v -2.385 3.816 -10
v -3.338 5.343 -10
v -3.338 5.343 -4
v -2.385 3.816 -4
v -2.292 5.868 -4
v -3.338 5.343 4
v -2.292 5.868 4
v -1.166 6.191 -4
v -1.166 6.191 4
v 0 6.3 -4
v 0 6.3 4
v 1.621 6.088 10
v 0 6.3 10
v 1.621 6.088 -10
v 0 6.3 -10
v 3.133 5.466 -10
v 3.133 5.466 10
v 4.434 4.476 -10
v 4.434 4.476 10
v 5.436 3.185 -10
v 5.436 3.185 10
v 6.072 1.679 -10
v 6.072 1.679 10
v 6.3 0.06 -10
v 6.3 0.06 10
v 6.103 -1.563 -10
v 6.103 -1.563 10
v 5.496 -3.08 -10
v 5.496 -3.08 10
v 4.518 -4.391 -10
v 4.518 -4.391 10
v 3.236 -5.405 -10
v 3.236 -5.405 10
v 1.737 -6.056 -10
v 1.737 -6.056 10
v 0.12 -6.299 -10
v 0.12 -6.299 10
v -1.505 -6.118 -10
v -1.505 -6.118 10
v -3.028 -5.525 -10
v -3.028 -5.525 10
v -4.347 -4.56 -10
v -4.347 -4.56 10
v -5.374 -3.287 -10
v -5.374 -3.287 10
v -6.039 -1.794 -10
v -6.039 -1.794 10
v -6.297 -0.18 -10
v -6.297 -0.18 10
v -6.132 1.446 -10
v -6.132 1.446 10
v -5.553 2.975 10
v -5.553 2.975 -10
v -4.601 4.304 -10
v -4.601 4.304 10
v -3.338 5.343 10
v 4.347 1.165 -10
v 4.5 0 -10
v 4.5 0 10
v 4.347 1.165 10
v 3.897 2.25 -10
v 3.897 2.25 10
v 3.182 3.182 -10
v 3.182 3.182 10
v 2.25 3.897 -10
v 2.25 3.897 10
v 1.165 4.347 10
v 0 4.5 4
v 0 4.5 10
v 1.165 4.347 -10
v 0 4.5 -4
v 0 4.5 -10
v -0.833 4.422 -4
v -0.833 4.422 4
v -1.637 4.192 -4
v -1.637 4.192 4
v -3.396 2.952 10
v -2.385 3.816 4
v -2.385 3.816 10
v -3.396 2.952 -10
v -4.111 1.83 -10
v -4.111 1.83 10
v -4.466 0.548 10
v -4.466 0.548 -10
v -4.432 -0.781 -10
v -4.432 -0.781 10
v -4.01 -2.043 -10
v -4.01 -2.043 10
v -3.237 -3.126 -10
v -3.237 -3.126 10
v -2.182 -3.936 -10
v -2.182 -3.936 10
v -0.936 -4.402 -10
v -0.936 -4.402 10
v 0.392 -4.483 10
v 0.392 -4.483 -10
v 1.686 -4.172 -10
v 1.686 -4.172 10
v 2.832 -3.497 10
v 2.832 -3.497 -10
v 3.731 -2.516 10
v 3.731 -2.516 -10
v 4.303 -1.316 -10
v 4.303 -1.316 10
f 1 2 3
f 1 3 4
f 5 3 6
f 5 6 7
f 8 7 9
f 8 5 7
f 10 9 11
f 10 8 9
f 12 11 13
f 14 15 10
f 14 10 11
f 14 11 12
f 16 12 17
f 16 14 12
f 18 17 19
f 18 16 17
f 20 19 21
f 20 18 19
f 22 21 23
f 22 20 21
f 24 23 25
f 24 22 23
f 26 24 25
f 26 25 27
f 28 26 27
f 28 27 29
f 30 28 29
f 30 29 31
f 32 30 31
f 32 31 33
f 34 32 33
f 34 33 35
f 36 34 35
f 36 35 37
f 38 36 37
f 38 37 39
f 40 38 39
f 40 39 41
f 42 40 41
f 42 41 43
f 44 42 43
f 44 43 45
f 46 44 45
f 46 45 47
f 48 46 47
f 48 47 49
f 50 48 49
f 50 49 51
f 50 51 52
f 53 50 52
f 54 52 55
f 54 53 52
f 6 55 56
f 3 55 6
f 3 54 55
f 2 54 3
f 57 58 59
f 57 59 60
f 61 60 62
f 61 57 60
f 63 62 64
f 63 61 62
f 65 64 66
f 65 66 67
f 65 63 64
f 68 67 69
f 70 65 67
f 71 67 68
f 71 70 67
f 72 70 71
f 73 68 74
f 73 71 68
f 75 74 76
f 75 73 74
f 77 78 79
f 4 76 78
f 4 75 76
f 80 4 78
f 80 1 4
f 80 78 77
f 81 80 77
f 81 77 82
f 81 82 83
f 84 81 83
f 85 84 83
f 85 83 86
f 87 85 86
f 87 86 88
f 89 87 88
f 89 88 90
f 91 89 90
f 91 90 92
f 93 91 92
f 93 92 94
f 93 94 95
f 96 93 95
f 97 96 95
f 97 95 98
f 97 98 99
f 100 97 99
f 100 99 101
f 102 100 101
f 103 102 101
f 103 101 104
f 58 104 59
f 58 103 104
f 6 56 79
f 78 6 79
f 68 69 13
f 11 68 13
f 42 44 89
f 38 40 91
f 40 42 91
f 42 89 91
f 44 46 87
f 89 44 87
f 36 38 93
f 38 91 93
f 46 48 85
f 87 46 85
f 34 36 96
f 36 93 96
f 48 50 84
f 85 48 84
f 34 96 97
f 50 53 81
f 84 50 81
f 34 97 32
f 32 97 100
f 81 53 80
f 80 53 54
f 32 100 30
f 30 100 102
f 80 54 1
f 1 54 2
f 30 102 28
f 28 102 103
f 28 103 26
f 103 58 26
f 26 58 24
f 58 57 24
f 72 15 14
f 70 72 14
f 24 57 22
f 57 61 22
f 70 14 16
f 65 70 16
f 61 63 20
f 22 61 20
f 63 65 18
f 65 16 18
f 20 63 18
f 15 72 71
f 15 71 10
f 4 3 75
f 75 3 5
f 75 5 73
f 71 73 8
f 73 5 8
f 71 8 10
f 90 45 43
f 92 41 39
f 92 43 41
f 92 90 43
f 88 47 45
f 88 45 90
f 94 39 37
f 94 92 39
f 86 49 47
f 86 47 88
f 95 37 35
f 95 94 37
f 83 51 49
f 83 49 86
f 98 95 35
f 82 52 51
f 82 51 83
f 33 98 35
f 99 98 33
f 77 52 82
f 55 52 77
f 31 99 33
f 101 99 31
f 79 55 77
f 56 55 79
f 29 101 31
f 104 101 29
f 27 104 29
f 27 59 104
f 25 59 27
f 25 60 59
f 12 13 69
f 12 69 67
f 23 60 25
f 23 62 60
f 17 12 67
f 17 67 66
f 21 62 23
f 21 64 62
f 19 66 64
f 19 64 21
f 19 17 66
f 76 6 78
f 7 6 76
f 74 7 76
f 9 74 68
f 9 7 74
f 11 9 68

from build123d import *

# Parameters (mm, degrees)
BOSS_EXTRUDE1_DEPTH      = 10
BOSS_EXTRUDE1_DEPTH_BACK = 10
SKETCH1_R                = 6.5
SKETCH1_R_2              = 4.5
CUT_EXTRUDE2_DEPTH       = 6
CUT_EXTRUDE3_DEPTH       = 6
SKETCH4_R                = 6.5
SKETCH4_R_2              = 6.3
CUT_EXTRUDE4_DEPTH       = 23.011360703


with BuildPart() as part:
    # Sketch1 → Boss-Extrude1 (new, two sides: drawn at the far end of the back side and taken through both)
    with BuildSketch(Plane.XY.offset(-BOSS_EXTRUDE1_DEPTH_BACK)):
        Circle(SKETCH1_R)
        Circle(SKETCH1_R_2, mode=Mode.SUBTRACT)
    extrude(amount=BOSS_EXTRUDE1_DEPTH + BOSS_EXTRUDE1_DEPTH_BACK)

    # Sketch2 → Cut-Extrude2 (cut)
    with BuildSketch(Plane.XY.offset(10)):
        with BuildLine():
            Line((-6.230040483, 9.970148902), (0, 0))
            Line((0, 0), (0, 11.756584264))
            ThreePointArc((0, 11.756584264), (-3.2405538, 11.301154128), (-6.230040483, 9.970148902))
        make_face()
    extrude(amount=-CUT_EXTRUDE2_DEPTH, mode=Mode.SUBTRACT)

    # Sketch3 → Cut-Extrude3 (cut)
    with BuildSketch(Plane.XY.offset(-10)):
        with BuildLine():
            Line((-6.230040483, 9.970148902), (0, 0))
            Line((0, 0), (0, 11.756584264))
            ThreePointArc((0, 11.756584264), (-3.2405538, 11.301154128), (-6.230040483, 9.970148902))
        make_face()
    extrude(amount=CUT_EXTRUDE3_DEPTH, mode=Mode.SUBTRACT)

    # Sketch4 → Cut-Extrude4 (cut, through all)
    with BuildSketch(Plane(origin=(0, 0, -10), x_dir=(-1, 0, 0), z_dir=(0, 0, -1))):
        Circle(SKETCH4_R)
        Circle(SKETCH4_R_2, mode=Mode.SUBTRACT)
    extrude(amount=-CUT_EXTRUDE4_DEPTH, mode=Mode.SUBTRACT)


solid = part.part
